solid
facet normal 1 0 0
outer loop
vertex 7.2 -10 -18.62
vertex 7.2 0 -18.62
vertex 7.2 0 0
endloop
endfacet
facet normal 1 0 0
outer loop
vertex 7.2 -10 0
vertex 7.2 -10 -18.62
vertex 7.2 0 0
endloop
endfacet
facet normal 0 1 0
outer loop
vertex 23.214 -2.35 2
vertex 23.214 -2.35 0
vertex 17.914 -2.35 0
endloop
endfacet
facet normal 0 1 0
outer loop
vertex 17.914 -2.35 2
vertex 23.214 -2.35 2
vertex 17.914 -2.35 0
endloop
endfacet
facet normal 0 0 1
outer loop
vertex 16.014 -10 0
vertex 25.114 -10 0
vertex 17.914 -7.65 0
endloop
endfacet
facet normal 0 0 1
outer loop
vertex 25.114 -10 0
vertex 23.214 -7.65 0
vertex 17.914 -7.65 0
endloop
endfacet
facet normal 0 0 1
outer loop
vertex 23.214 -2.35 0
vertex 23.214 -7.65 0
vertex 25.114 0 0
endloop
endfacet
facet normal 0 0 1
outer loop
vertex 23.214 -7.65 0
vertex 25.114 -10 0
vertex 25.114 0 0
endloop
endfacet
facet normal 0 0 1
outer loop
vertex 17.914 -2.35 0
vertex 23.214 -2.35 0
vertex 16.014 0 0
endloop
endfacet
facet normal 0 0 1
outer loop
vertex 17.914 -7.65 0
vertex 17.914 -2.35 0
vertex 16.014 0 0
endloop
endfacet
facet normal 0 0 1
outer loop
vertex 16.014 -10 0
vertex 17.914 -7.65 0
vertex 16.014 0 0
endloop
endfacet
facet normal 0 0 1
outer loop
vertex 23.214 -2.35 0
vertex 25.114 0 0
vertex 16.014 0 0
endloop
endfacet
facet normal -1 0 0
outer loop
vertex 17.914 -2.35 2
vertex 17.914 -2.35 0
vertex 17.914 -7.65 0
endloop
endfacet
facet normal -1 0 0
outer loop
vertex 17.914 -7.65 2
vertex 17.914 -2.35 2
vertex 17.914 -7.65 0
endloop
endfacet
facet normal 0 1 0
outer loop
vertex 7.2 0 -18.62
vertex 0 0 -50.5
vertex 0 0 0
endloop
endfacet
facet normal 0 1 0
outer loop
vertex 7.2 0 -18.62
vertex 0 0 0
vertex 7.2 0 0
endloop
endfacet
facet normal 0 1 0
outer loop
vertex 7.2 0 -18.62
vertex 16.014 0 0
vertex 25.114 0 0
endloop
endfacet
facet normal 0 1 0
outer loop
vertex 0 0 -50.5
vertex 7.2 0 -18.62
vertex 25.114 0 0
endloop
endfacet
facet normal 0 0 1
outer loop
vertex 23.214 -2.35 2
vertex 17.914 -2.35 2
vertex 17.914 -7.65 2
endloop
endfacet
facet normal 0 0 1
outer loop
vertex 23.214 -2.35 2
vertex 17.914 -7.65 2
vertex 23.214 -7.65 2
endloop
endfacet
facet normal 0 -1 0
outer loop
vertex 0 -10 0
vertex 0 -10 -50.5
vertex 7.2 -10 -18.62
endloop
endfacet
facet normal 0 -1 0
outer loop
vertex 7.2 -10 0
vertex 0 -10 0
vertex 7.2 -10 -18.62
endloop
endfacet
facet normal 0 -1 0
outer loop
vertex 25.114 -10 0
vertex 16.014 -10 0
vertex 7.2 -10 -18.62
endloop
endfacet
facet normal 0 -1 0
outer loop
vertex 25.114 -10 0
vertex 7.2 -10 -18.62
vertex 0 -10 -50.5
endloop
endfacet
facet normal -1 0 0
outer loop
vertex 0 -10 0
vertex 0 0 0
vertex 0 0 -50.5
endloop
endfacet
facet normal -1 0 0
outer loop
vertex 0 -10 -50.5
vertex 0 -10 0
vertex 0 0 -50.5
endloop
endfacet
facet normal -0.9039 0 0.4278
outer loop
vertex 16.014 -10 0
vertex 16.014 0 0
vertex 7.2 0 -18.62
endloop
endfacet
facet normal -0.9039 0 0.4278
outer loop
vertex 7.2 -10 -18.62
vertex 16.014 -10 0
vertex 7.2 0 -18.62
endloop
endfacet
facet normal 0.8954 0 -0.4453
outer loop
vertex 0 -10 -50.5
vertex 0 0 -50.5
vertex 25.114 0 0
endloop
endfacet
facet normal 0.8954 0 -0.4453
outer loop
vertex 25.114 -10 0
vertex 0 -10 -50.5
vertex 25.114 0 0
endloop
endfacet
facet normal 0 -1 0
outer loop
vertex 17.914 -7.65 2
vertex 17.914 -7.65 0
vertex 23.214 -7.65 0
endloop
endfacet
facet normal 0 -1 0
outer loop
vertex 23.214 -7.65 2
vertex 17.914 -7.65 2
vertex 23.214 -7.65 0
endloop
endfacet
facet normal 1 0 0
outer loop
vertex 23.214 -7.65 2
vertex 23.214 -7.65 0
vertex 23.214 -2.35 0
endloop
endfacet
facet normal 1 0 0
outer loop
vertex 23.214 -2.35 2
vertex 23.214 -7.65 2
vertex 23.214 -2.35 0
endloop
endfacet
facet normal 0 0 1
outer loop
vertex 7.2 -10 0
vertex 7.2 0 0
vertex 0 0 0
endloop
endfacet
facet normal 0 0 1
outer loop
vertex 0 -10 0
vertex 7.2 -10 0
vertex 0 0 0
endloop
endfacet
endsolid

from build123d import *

# Parameters (mm, degrees)
F1_DEPTH = 10
F2_W     = 2.65
F2_H     = 2.65
F3_DEPTH = 2


with BuildPart() as f1:
    # F0 (on Front) → F1 (new body)
    with BuildSketch(Plane.XZ):
        Polygon((7.2, 0), (0, 0), (0, -50.5), (25.11394, 0), (16.01394, 0), (7.2, -18.62), align=None)
    extrude(amount=F1_DEPTH)

    # F2 (on face) → F3 (join)
    with BuildSketch(Plane.XY):
        with Locations((21.88894, -3.675)):
            Rectangle(F2_W, F2_H)
        with Locations((19.23894, -3.675)):
            Rectangle(F2_W, F2_H)
        with Locations((21.88894, -6.325)):
            Rectangle(F2_W, F2_H)
        with Locations((19.23894, -6.325)):
            Rectangle(F2_W, F2_H)
    extrude(amount=F3_DEPTH)


solid = f1.part
